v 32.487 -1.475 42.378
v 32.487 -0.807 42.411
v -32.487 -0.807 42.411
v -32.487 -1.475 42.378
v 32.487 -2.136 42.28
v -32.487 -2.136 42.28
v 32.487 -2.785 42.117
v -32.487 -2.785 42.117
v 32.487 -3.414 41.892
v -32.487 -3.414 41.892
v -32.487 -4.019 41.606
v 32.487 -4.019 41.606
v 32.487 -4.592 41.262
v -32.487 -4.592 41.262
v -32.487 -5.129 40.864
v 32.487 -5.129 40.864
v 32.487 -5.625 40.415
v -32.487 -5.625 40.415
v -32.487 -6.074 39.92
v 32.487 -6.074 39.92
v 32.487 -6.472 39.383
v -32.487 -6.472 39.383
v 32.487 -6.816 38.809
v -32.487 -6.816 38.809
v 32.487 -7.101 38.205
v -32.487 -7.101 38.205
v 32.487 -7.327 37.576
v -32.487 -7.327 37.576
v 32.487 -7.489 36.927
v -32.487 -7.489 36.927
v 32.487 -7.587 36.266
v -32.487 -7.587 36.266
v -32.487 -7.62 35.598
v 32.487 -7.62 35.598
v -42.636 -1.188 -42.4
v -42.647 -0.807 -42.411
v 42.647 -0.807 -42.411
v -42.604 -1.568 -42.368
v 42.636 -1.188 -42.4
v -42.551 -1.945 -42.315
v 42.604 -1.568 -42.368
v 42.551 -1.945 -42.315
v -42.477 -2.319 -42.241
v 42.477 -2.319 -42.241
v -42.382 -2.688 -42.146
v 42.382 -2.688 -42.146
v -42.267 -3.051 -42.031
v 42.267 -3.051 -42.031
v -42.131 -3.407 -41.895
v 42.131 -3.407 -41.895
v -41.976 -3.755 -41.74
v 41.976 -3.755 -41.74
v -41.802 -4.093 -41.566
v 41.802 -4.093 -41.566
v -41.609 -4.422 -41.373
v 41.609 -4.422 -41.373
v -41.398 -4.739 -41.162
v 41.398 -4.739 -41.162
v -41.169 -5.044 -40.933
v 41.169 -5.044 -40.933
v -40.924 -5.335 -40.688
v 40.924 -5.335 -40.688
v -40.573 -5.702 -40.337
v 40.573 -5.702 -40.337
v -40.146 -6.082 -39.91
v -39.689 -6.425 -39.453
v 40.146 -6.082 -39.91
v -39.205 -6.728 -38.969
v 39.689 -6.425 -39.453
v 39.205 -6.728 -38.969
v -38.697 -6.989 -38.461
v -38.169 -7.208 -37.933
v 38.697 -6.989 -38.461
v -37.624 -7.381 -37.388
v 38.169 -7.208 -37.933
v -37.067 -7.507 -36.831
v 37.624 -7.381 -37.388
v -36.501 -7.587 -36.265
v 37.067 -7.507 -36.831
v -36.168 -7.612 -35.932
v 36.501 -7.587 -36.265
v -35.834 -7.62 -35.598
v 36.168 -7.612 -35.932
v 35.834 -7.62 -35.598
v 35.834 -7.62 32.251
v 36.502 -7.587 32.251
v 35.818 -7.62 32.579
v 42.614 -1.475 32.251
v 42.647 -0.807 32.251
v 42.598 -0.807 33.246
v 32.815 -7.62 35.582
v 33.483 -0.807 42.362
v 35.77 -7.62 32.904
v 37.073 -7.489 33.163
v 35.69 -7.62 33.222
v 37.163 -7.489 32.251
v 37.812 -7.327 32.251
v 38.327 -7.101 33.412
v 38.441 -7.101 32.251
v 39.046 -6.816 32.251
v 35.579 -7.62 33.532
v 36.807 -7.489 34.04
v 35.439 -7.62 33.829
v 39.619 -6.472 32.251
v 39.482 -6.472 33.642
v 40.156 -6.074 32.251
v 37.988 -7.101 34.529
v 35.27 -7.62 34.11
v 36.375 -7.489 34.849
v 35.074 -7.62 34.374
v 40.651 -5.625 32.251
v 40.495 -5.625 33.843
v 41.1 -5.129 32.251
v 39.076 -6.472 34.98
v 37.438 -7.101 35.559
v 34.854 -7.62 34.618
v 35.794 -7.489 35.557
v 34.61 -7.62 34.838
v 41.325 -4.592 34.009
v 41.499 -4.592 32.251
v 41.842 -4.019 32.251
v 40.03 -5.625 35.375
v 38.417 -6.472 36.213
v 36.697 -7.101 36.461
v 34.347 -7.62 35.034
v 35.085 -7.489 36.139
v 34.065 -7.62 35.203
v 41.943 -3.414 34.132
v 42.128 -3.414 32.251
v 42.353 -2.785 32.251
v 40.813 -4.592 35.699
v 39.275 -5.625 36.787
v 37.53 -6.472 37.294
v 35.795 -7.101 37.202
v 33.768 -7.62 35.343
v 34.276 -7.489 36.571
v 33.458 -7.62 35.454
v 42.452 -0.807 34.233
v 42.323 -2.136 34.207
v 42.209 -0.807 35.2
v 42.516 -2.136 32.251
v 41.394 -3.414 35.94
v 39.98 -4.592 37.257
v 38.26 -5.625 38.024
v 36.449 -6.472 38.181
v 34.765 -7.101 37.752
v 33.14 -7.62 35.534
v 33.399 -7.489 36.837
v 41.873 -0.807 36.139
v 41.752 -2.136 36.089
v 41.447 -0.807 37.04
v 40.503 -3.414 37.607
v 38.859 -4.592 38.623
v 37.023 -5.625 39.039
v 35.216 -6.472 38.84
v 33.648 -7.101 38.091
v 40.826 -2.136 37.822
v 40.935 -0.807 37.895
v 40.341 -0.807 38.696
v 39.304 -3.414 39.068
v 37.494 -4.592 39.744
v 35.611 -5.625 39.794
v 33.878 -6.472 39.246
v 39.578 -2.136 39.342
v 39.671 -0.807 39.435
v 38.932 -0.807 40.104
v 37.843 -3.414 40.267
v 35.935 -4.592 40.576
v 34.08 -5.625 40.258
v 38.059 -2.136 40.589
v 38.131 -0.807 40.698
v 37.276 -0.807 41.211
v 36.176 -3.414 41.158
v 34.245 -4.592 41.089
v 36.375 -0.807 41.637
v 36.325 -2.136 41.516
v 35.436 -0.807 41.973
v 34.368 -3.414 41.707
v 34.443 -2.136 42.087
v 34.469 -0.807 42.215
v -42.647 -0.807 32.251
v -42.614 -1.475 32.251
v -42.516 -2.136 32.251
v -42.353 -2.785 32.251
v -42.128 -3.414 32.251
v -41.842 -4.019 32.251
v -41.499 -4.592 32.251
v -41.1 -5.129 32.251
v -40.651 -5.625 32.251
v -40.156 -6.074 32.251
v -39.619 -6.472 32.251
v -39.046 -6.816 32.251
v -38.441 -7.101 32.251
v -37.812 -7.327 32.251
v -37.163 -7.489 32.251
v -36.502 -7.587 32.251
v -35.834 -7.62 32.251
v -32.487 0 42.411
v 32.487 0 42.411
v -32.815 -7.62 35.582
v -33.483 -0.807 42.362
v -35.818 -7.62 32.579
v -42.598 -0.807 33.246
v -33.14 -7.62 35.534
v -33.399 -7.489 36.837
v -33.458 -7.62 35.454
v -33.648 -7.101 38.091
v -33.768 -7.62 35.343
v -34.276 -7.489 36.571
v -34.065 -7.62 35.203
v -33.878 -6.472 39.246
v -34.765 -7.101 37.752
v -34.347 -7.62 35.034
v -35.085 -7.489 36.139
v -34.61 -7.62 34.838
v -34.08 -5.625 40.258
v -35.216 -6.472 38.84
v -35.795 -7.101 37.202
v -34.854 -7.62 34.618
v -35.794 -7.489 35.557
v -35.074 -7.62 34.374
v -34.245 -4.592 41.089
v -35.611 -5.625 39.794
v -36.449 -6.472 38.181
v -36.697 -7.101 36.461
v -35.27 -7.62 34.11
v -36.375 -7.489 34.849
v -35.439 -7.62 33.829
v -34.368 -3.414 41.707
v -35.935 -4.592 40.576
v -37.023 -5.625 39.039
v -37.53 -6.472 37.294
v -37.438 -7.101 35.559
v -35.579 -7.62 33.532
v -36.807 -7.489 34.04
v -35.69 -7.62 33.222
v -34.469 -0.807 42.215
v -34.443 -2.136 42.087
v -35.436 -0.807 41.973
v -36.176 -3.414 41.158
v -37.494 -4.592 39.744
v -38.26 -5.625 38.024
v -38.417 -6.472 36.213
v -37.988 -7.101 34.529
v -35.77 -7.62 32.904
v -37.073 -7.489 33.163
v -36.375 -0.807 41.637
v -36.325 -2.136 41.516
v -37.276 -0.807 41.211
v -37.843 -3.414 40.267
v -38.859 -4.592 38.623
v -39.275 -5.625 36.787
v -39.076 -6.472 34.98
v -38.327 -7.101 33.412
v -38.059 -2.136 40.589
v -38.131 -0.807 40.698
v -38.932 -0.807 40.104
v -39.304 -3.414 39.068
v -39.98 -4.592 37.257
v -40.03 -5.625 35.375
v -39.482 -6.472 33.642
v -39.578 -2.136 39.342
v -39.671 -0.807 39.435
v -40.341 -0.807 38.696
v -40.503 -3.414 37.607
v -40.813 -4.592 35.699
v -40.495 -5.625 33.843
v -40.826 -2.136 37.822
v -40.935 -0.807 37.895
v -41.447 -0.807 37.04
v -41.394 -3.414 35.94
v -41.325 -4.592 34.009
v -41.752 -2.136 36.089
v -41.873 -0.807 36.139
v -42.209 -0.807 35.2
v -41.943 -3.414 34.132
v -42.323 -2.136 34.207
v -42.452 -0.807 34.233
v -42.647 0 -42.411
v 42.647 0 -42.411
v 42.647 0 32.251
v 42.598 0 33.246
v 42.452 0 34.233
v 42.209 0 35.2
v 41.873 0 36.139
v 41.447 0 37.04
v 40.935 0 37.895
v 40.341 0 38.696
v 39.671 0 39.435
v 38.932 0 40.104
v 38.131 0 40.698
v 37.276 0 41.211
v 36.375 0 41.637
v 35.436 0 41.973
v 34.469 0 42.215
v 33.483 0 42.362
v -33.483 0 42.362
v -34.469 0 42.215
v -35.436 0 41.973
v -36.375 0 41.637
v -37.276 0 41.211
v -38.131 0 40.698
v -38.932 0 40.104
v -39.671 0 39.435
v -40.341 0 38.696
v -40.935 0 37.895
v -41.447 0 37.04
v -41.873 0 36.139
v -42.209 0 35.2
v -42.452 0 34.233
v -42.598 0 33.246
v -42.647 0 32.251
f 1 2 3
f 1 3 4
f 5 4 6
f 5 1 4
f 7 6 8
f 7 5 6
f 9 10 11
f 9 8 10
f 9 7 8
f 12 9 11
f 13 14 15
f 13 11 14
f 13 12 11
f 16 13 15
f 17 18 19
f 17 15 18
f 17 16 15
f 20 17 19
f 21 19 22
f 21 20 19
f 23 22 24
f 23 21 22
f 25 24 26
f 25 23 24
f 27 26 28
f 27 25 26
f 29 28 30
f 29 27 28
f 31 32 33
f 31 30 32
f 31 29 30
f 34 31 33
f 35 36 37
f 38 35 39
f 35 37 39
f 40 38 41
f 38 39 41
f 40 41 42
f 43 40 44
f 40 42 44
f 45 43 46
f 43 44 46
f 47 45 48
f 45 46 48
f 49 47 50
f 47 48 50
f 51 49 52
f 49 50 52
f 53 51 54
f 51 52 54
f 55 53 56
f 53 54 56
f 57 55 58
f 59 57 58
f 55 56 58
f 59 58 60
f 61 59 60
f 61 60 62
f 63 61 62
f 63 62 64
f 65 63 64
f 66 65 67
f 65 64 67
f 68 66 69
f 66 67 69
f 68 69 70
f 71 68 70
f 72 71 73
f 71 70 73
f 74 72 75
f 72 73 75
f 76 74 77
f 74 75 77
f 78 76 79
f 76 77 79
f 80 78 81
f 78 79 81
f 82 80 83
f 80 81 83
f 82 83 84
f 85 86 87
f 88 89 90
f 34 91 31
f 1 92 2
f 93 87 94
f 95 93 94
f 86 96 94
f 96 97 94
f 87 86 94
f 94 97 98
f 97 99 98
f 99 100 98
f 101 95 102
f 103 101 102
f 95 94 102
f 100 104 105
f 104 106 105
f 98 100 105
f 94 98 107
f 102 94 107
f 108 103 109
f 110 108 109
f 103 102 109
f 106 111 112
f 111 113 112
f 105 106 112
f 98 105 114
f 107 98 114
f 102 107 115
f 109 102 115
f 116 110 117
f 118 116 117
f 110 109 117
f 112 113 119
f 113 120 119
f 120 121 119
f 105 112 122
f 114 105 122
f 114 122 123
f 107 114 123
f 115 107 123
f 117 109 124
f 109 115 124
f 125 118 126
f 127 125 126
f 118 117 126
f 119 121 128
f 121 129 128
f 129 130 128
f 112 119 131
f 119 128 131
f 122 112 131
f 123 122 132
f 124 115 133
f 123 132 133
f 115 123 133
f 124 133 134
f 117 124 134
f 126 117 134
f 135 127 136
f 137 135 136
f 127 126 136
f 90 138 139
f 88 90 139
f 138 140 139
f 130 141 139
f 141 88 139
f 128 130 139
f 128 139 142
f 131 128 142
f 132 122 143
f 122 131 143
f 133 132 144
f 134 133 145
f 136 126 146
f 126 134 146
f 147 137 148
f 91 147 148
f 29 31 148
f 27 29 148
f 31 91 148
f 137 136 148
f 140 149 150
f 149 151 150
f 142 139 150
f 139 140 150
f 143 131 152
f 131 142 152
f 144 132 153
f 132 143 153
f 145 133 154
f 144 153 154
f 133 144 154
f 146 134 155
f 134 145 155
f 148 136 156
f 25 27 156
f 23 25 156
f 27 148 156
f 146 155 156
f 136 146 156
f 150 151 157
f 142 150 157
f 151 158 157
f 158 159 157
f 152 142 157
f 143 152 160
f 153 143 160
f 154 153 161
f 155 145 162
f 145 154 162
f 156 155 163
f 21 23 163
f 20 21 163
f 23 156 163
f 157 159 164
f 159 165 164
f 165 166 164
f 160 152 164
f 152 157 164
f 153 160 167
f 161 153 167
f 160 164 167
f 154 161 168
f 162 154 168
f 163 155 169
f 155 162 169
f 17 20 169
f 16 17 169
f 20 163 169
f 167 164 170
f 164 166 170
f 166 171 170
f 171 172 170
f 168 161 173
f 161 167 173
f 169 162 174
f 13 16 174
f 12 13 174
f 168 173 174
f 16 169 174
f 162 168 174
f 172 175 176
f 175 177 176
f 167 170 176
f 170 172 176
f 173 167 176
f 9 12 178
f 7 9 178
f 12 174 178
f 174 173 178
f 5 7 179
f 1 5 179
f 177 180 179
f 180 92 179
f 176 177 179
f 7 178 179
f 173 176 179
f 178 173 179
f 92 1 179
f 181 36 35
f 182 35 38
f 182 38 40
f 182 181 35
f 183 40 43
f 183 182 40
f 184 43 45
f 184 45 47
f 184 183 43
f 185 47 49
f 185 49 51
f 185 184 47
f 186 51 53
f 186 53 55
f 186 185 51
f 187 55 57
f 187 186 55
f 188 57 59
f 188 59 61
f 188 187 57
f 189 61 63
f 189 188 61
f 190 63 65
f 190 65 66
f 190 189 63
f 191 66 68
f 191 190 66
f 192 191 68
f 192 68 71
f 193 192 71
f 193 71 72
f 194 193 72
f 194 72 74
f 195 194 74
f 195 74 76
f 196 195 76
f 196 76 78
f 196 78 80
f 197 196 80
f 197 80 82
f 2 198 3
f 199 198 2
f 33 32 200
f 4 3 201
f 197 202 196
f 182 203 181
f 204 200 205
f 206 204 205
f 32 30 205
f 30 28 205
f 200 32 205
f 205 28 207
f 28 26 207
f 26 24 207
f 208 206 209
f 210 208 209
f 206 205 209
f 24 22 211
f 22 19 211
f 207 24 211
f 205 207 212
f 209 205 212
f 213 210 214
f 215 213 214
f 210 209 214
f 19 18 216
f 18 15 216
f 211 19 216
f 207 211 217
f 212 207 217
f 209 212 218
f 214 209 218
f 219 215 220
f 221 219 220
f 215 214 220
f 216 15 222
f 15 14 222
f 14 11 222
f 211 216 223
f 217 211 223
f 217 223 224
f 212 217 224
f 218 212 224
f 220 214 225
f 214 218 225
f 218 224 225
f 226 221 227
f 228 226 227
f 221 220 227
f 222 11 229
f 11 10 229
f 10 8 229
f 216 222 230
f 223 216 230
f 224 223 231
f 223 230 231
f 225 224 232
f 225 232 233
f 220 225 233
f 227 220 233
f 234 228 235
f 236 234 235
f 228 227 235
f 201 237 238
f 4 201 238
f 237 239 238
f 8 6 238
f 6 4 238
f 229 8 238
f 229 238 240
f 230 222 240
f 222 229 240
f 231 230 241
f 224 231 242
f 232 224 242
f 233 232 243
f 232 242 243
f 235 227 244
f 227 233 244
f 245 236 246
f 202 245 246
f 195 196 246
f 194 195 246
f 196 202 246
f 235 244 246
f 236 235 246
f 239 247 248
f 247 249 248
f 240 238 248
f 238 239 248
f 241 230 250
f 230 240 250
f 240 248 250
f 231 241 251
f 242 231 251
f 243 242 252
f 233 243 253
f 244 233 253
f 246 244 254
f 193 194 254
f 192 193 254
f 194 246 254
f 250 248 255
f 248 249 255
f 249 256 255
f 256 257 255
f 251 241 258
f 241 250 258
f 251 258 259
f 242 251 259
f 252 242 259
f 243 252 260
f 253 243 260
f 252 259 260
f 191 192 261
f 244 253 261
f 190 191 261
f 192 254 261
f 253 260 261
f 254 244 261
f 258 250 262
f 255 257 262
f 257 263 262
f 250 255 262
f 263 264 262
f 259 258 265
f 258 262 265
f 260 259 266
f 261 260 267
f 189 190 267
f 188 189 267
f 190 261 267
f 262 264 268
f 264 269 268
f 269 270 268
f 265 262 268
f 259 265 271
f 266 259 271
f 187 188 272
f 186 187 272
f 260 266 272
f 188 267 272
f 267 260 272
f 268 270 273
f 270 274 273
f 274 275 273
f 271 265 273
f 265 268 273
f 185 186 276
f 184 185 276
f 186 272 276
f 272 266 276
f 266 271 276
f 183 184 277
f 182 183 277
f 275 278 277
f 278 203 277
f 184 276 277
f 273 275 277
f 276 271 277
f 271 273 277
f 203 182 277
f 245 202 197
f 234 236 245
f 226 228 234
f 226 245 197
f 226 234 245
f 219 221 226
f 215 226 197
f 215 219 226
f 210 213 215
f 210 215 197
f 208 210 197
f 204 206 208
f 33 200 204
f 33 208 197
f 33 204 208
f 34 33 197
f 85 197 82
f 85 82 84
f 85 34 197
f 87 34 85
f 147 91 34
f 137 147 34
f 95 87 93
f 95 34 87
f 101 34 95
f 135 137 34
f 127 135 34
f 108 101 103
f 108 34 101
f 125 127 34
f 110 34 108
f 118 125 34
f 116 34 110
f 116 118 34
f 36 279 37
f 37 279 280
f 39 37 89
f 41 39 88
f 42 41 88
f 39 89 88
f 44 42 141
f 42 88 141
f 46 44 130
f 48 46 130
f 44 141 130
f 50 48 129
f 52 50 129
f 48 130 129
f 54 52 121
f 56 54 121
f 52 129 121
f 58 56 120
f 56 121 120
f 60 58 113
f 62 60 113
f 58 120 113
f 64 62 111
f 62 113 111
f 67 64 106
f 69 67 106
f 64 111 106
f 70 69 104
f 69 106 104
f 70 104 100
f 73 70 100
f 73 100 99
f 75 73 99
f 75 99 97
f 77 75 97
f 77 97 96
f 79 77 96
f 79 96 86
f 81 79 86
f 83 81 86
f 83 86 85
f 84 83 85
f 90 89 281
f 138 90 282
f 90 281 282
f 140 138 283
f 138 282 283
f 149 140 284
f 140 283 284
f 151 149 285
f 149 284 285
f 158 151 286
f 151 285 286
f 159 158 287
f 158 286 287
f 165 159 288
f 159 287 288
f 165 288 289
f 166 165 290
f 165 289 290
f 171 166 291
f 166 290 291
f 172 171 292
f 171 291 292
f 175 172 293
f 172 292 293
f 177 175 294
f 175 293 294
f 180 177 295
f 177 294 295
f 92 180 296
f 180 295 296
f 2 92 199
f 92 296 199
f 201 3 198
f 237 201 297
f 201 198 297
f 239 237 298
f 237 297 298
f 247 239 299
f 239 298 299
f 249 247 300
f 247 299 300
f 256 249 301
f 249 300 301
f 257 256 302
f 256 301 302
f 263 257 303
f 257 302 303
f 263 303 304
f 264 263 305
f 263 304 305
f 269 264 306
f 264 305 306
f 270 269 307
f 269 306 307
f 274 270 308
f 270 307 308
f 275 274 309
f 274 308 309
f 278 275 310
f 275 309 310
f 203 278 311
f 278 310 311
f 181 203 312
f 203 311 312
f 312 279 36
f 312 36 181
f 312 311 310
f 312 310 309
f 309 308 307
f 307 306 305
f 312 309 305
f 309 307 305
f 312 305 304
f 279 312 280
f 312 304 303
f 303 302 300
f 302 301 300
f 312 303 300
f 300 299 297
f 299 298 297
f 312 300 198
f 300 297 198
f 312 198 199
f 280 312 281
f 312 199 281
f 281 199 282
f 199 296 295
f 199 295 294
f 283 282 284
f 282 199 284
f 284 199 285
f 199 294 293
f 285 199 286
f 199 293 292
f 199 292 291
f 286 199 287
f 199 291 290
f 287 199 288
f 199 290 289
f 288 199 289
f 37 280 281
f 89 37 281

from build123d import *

# Parameters (mm, degrees)
F0_W        = 85.2935686707
F0_H        = 84.8211869597
F0_R        = 1.905
F0_R_2      = 0.8509
F1_DEPTH    = 7.62
F2_R        = 6.8125926862
F3_T1_DEPTH = 33.02
F3_T4_ANGLE = 90
F3_T6_ANGLE = 90


# Not quite as in the source:
# - a fillet or chamfer that OpenCascade refuses, or shapes differently, is made with other operations: its cross-section is extruded or revolved along the edge and cut away or added


with BuildPart() as f1:
    # F0 (on Front) → F1 (new body)
    with BuildSketch(Plane.XZ):
        Rectangle(F0_W, F0_H)
        Polygon((0, 38.1), (38.1, 38.1), (38.1, -38.1), (0, -38.1), (-38.1, -38.1), (-38.1, 38.1), align=None, mode=Mode.SUBTRACT)
        Polygon((25.4, 25.4), (0, 25.4), (-25.4, 25.4), (-25.4, -25.4), (0, -25.4), (25.4, -25.4), align=None)
        with Locations((-18.288, -12.446)):
            Circle(F0_R, mode=Mode.SUBTRACT)
        with Locations((19.812, -12.446)):
            Circle(F0_R, mode=Mode.SUBTRACT)
        with Locations((-18.288, 12.954)):
            Circle(F0_R, mode=Mode.SUBTRACT)
        with Locations((19.812, 12.954)):
            Circle(F0_R, mode=Mode.SUBTRACT)
        Polygon((0, 25.4), (0, 38.1), (-38.1, 38.1), (-38.1, -38.1), (0, -38.1), (0, -25.4), (-25.4, -25.4), (-25.4, 25.4), align=None)
        Polygon((38.1, -38.1), (38.1, 38.1), (0, 38.1), (0, 25.4), (25.4, 25.4), (25.4, -25.4), (0, -25.4), (0, -38.1), align=None)
        with Locations((-18.288, -12.446)):
            Circle(F0_R)
        with Locations((-18.288, -12.446)):
            Circle(F0_R_2, mode=Mode.SUBTRACT)
        with Locations((-18.288, 12.954)):
            Circle(F0_R)
        with Locations((-18.288, 12.954)):
            Circle(F0_R_2, mode=Mode.SUBTRACT)
        with Locations((19.812, 12.954)):
            Circle(F0_R)
        with Locations((19.812, 12.954)):
            Circle(F0_R_2, mode=Mode.SUBTRACT)
        with Locations((19.812, -12.446)):
            Circle(F0_R)
        with Locations((19.812, -12.446)):
            Circle(F0_R_2, mode=Mode.SUBTRACT)
        with Locations((-18.288, 12.954)):
            Circle(F0_R_2)
        with Locations((-18.288, -12.446)):
            Circle(F0_R_2)
        with Locations((19.812, 12.954)):
            Circle(F0_R_2)
        with Locations((19.812, -12.446)):
            Circle(F0_R_2)
    extrude(amount=F1_DEPTH)

    # F2
    f2_edges = [f1.edges().sort_by_distance(p)[0] for p in [
        (0, -7.62, -42.410593),
        (-42.646784, -7.62, 0),
        (0, -7.62, 42.410593),
        (42.646784, -7.62, 0),
    ]]
    fillet(f2_edges, radius=F2_R)

    # F3: fillet of radius 10.16 on 2 edges, made by hand

    # F3_s2 → F3_t1 (cut)
    with BuildSketch(Plane.XZ.offset(-25.4)):
        with BuildLine():
            ThreePointArc((42.6467843354, 32.2505934799), (39.6709892322, 39.4347983767), (32.4867843354, 42.4105934799))
            Line((32.4867843354, 42.4105934799), (42.6467843354, 42.4105934799))
            Line((42.6467843354, 42.4105934799), (42.6467843354, 32.2505934799))
        make_face()
        with BuildLine():
            ThreePointArc((-32.4867843354, 42.4105934799), (-39.6709892322, 39.4347983767), (-42.6467843354, 32.2505934799))
            Line((-42.6467843354, 32.2505934799), (-42.6467843354, 42.4105934799))
            Line((-42.6467843354, 42.4105934799), (-32.4867843354, 42.4105934799))
        make_face()
    extrude(amount=F3_T1_DEPTH, mode=Mode.SUBTRACT)

    # F3_s3 → F3_t4 (revolve, cut)
    with BuildSketch(Plane.YZ.offset(-32.4867843354)):
        with BuildLine():
            ThreePointArc((-7.62, 35.5980007937), (-5.6246377997, 40.4152312796), (-0.8074073138, 42.4105934799))
            Line((-0.8074073138, 42.4105934799), (-7.62, 42.4105934799))
            Line((-7.62, 42.4105934799), (-7.62, 35.5980007937))
        make_face()
    revolve(axis=Axis((-32.4867843354, -7.62, 32.2505934799), (0, -1, 0)), revolution_arc=F3_T4_ANGLE, mode=Mode.SUBTRACT)

    # F3_s5 → F3_t6 (revolve, cut)
    with BuildSketch(Plane.XY.offset(32.2505934799)):
        with BuildLine():
            ThreePointArc((35.8341916492, -7.62), (40.6514221351, -5.6246377997), (42.6467843354, -0.8074073138))
            Line((42.6467843354, -0.8074073138), (42.6467843354, -7.62))
            Line((42.6467843354, -7.62), (35.8341916492, -7.62))
        make_face()
    revolve(axis=Axis((32.4867843354, -7.62, 32.2505934799), (0, -1, 0)), revolution_arc=F3_T6_ANGLE, mode=Mode.SUBTRACT)


solid = f1.part
